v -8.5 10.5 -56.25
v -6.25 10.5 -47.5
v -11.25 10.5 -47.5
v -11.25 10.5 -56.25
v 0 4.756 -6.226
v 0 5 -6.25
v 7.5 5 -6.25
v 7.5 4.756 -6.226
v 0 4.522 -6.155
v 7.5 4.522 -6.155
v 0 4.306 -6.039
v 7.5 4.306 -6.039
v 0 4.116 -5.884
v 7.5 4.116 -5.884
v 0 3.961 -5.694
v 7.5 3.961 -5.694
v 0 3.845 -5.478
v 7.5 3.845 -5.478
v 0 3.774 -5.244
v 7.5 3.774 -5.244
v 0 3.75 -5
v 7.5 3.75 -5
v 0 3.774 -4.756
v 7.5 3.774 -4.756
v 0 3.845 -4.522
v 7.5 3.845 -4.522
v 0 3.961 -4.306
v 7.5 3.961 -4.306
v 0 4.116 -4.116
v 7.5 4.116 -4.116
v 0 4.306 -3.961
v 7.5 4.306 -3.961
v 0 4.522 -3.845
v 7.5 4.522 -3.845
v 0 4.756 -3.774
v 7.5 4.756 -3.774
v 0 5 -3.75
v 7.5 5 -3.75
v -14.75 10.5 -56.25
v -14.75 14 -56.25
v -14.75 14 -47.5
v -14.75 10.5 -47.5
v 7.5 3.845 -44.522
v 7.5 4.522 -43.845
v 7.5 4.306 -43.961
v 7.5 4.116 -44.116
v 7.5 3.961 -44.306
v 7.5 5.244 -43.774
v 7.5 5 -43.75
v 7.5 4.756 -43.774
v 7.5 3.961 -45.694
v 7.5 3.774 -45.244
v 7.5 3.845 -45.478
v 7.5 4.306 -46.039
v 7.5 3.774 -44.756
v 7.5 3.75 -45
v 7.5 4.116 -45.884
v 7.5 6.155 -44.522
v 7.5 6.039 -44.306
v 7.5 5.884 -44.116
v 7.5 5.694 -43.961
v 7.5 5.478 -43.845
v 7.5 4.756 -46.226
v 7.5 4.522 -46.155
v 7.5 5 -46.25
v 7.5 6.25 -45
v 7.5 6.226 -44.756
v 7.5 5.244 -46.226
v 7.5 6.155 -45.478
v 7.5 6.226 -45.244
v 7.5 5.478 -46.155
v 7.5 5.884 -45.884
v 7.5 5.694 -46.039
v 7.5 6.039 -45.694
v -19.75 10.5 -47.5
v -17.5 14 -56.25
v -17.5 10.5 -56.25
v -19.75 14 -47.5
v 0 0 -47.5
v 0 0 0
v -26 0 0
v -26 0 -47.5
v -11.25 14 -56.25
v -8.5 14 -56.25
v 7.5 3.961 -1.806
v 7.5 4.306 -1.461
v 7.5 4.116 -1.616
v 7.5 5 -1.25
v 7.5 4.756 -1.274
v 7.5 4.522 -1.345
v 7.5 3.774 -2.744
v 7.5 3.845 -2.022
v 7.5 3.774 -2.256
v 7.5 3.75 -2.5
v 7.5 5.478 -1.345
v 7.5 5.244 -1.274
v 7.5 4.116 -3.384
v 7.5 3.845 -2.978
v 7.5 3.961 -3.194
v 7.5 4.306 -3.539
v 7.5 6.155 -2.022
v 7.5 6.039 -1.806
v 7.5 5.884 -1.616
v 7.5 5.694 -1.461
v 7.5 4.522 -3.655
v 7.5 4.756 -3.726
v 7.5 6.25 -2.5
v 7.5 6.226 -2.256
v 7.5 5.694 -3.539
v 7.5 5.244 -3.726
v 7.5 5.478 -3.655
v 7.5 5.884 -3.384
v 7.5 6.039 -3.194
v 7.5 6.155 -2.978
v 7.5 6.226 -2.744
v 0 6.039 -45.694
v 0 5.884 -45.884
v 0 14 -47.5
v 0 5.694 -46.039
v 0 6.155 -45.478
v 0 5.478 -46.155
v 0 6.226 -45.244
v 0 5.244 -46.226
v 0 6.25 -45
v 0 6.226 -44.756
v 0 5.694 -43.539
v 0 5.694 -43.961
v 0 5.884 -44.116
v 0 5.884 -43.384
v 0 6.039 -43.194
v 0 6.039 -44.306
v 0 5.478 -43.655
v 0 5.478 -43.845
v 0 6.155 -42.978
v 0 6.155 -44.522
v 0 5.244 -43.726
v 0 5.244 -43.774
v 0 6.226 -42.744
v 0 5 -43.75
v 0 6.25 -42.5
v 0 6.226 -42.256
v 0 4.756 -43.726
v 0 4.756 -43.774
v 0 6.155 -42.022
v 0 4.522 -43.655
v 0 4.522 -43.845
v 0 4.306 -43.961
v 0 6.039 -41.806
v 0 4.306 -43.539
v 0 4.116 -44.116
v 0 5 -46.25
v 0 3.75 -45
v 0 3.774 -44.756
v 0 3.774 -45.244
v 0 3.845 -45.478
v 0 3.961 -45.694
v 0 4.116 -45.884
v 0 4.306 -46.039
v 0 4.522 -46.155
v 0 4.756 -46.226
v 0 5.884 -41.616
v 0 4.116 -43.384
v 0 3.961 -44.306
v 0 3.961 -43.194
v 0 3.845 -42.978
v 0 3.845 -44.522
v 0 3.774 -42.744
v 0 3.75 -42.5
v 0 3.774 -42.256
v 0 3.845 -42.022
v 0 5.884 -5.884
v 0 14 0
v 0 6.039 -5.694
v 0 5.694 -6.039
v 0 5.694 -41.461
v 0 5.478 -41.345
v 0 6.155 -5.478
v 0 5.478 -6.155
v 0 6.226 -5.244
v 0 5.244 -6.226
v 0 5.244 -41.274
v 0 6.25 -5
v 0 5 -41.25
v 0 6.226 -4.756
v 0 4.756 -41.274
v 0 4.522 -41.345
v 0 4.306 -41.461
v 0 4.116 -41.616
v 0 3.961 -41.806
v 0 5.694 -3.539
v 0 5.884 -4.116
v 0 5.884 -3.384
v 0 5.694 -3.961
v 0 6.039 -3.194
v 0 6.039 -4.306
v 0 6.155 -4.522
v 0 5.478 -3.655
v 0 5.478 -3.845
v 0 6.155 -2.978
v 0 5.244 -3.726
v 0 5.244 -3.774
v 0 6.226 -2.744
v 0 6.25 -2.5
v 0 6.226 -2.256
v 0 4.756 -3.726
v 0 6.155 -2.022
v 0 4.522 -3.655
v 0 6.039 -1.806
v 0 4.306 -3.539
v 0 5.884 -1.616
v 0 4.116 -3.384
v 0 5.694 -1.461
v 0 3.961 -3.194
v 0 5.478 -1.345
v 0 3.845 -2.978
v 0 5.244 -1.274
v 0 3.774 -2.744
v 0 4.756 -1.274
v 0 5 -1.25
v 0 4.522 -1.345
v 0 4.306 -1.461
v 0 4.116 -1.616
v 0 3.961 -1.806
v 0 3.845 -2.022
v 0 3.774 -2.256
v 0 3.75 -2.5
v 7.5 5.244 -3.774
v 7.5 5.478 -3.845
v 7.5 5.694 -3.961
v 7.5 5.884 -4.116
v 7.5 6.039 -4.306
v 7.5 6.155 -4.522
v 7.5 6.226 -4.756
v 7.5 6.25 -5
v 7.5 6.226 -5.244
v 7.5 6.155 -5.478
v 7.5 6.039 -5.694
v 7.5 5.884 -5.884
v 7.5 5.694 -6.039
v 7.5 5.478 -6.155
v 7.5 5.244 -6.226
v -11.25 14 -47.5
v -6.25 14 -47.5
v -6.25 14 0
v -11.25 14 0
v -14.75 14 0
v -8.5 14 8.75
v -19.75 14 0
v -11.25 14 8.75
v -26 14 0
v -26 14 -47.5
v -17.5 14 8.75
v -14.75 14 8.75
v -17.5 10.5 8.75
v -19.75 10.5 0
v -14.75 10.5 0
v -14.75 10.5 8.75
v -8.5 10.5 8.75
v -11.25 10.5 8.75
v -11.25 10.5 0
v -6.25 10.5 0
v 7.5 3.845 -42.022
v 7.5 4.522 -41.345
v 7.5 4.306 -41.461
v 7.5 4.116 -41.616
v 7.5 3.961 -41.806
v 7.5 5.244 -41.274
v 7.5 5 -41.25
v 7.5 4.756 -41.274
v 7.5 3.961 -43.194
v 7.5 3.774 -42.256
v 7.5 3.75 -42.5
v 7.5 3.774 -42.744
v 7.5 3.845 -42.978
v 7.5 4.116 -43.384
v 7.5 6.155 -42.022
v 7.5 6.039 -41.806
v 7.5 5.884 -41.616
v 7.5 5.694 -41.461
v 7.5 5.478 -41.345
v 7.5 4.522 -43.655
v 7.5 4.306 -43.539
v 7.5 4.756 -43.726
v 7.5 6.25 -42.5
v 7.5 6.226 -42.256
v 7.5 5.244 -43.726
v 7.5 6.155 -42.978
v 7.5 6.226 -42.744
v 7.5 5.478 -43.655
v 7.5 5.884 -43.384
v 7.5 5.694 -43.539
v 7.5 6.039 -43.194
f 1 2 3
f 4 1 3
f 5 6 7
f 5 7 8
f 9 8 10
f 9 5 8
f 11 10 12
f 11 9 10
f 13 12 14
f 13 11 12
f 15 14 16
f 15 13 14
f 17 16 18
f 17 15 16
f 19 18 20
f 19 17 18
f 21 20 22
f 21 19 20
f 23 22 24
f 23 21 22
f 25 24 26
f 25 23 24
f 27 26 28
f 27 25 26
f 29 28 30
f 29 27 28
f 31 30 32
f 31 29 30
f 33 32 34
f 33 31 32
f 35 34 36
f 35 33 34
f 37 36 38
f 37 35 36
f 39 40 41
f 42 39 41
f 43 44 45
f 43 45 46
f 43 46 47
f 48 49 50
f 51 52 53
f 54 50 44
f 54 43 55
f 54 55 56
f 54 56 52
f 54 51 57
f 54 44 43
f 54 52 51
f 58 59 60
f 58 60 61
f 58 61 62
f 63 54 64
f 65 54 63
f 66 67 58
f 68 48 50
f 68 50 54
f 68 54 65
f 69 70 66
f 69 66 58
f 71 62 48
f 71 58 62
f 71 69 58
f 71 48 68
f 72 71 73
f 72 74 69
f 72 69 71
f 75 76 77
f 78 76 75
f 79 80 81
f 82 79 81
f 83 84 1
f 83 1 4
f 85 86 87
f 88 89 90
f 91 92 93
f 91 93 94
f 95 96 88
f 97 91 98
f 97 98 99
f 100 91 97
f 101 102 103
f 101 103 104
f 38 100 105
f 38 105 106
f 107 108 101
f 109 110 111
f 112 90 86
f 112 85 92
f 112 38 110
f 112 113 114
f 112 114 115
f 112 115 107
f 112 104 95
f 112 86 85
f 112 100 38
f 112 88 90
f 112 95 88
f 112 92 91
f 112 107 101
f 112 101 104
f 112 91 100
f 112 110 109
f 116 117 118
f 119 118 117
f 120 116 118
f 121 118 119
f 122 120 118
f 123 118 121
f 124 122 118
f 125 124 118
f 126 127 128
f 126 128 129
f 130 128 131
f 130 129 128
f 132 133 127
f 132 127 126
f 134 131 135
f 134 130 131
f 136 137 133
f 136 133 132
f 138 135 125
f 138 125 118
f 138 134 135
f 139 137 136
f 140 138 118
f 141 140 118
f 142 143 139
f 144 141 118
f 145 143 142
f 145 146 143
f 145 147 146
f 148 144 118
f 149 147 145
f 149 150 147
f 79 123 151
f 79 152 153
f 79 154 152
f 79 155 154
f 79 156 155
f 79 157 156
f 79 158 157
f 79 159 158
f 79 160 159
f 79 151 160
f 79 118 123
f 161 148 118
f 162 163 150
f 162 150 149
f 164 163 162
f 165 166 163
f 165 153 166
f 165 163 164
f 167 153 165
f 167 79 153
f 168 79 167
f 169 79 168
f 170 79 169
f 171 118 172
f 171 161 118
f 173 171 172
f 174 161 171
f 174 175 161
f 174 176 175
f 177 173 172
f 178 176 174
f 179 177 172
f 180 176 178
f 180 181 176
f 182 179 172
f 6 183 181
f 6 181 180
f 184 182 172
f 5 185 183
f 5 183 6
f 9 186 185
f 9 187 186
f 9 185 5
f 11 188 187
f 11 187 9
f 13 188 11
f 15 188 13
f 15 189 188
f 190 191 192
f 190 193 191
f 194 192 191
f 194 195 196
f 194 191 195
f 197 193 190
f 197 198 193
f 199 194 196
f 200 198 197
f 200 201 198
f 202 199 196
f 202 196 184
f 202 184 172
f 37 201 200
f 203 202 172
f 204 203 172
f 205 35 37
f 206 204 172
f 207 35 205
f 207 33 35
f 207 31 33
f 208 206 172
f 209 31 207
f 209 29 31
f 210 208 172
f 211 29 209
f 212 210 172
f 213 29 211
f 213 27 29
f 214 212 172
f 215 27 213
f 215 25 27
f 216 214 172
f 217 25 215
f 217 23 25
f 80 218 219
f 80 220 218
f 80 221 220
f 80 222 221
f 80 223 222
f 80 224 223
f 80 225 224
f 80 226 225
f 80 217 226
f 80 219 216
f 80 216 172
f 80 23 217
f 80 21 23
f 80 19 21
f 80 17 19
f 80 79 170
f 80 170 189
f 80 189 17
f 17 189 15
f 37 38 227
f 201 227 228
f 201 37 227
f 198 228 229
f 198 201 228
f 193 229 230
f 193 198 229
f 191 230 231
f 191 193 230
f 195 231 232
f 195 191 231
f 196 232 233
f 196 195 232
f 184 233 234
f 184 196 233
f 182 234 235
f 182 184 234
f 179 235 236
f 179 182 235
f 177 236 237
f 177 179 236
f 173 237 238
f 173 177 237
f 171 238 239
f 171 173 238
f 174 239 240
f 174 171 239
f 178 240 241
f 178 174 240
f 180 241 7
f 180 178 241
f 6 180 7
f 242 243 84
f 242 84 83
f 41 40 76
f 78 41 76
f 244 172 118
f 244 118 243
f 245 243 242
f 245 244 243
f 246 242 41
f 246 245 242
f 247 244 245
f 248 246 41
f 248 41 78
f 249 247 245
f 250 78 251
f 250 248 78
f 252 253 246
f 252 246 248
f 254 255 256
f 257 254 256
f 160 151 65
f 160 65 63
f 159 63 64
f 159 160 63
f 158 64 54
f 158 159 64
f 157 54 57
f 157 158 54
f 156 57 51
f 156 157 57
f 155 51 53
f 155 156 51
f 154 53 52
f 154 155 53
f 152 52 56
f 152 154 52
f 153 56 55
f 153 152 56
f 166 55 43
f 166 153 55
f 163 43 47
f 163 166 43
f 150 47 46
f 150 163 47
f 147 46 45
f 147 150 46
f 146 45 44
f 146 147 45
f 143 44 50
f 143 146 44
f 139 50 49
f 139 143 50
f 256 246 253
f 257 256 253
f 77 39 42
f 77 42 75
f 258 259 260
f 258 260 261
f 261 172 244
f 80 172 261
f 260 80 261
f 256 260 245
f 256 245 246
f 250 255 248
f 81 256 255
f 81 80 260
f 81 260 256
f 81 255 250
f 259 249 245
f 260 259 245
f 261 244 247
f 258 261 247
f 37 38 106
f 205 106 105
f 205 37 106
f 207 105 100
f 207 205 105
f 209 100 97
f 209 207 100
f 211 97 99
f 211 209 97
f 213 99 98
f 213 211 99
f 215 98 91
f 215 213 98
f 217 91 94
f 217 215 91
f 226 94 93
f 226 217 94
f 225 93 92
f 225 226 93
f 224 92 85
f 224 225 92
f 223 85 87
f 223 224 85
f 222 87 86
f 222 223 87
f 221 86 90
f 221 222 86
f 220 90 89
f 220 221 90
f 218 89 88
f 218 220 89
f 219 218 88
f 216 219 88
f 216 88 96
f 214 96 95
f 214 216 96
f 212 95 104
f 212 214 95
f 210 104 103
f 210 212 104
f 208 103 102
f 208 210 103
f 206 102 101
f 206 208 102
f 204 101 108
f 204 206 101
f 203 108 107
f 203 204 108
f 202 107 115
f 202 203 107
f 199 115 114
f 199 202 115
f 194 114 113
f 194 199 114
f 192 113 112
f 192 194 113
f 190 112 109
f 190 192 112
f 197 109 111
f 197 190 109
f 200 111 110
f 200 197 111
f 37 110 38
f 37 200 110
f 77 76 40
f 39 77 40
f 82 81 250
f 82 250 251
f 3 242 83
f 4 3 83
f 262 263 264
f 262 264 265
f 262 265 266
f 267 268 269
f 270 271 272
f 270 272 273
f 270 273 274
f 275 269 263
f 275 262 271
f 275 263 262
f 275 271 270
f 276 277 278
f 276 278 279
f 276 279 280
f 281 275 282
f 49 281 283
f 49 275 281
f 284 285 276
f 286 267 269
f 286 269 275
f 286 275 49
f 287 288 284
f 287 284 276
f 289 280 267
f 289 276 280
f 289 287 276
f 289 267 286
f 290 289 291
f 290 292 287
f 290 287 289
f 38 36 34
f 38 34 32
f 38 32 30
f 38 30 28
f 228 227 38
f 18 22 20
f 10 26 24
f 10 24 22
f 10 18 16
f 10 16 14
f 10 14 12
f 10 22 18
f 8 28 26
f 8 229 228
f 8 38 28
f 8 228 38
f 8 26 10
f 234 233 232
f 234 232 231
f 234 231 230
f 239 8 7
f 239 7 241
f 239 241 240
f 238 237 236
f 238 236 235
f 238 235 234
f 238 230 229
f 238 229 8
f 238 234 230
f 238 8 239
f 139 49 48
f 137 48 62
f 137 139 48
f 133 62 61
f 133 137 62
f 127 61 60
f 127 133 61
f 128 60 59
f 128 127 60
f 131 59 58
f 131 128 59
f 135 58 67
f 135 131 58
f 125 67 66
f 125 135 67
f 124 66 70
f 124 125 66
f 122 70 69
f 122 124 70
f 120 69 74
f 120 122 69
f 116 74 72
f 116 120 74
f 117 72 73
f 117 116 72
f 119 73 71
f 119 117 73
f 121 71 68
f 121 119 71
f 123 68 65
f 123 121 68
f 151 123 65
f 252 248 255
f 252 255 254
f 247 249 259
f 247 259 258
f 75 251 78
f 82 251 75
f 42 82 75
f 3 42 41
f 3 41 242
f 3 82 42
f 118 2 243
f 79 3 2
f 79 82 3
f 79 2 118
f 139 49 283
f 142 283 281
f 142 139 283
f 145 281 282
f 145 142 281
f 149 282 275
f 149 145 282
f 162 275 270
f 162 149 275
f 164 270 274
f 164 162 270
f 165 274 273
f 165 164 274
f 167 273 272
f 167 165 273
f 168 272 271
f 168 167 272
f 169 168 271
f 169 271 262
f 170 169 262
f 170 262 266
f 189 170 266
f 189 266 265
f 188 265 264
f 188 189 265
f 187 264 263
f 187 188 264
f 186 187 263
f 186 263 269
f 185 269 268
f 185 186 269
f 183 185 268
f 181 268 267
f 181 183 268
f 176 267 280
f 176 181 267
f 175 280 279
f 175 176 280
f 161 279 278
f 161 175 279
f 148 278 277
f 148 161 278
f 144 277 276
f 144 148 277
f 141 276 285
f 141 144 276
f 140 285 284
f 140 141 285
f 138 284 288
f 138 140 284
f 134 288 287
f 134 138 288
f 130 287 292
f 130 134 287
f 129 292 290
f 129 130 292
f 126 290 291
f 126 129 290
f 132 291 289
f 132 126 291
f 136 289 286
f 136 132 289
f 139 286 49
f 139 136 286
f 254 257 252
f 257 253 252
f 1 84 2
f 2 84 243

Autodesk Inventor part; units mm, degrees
ref_plane "YZ Plane" through (0, 0, 0) normal (1, 0, 0) x (0, 1, 0)
ref_plane "XZ Plane" through (0, 0, 0) normal (0, 1, 0) x (-1, 0, 0)
sketch "Sketch1" plane through (0, 0, 0) normal (0, 1, 0) x (-1, 0, 0)
  line L0 (0, 0) -> (26, 0)
  line L1 (26, 0) -> (26, -47.5)
  line L2 (26, -47.5) -> (0, -47.5)
  line L3 (0, -47.5) -> (0, 0)
  dimension "d0" = 26
  dimension "d1" = 47.5
extrude "Extrusion1" add sketch "Sketch1" along normal blind 14
sketch "Sketch2" plane through (0, 14, 0) normal (0, 1, 0) x (1, 0, 0)
  line L0 (-26, 0) -> (0, 0) projected
  line L1 (-13, 0) -> (-13, -8.75)
  line L2 (-13, -8.75) -> (-13, 0) construction
  line L3 (-11.25, -8.75) -> (-11.25, 0)
  line L4 (-14.75, 0) -> (-14.75, -8.75)
  arc A0 (-14.75, -8.75) -> (-11.25, -8.75) centre (-13, -8.75) ccw
  arc A1 (-11.25, 0) -> (-14.75, 0) centre (-13, 0) ccw
  line L5 (-14.75, -8.75) -> (-17.5, -8.75)
  line L6 (-11.25, -8.75) -> (-8.5, -8.75)
  line L7 (-11.25, -8.75) -> (-14.75, -8.75)
  line L8 (-26, 0) -> (-19.75, 0)
  line L9 (-19.75, 0) -> (-17.5, -8.75)
  line L10 (0, 0) -> (-6.25, 0)
  line L11 (-6.25, 0) -> (-8.5, -8.75)
  point P0 (-13, -4.375)
  dimension "d4" = 8.75
  dimension "d5" = 3.5
  dimension "d6" = 2.75
  dimension "d7" = 2.75
  dimension "d8" = 6.25
  dimension "d9" = 6.25
extrude "Extrusion2" add sketch "Sketch2" against normal blind 3.5 contours L0 L4 L5 L9 | L0 L11 L6 L3
ref_plane "Work Plane1" through (0, 0, -23.75) normal (0, 0, 1) x (1, 0, 0)
mirror "Mirror1" about plane through (0, 0, -23.75) normal (0, 0, 1) of "Extrusion2"
sketch "Sketch4" plane through (0, 0, 0) normal (1, 0, 0) x (0, 0, -1)
  line L0 (0, 0) -> (0, 14) projected
  line L1 (0, 0) -> (0, 5)
  line L2 (0, 5) -> (5, 5)
  circle A0 centre (5, 5) radius 1.25
  circle A1 centre (2.5, 5) radius 1.25
  line L3 (0, 0) -> (47.5, 0) projected
  line L4 (47.5, 0) -> (47.5, 5)
  line L5 (47.5, 0) -> (47.5, 14) projected
  line L6 (47.5, 5) -> (42.5, 5)
  circle A2 centre (42.5, 5) radius 1.25
  circle A3 centre (45, 5) radius 1.25
  point P0 (43.75, 5)
  point P1 (3.75, 5)
  dimension "d13" = 5
  dimension "d14" = 5
  dimension "d15" = 2.5
  dimension "d16" = 2.5
  dimension "d17" = 5
  dimension "d18" = 5
  dimension "d19" = 2.5
  dimension "d20" = 2.5
extrude "Extrusion3" add sketch "Sketch4" along normal blind 7.5
properties part number "12_24_5VUSBConverter"
